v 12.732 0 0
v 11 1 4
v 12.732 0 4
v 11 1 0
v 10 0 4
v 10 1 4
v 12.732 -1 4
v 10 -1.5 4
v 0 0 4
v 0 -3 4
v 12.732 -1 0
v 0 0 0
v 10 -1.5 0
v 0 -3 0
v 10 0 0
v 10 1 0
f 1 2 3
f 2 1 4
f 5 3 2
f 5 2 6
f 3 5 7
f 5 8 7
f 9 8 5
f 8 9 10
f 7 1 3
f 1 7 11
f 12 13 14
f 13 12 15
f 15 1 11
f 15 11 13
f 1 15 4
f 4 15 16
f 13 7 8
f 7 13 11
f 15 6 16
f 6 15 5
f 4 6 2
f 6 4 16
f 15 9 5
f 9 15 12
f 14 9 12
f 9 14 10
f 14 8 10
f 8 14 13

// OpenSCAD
/*simple Snap library based on "Snap-Fit Joints for Plastics - A Design Guid" by Bayer MaterialScience LLC 
  http://fab.cba.mit.edu/classes/S62.12/people/vernelle.noel/Plastic_Snap_fit_design.pdf
 
 on http://www.thingiverse.com/thing:1860118
 
    by fpetrac Fausto Petraccone fpetrac@gmail.com 
    Licensed under the Creative Commons - Attribution - Non-Commercial license.
*/

/*Rev
    SnapLib 0.36.scad: added SnapHoleY function  
    SnapLib 0.35.scad: on RSnapY added a check to avioid interference of lobes during closure; on RRSnappY added a check to avioid overlapped lobes.
    SnapLib 0.30.scad  added function Hsnap and Snap to calculate the snap H or Y for cantilever snap
    SnapLib 0.25.scad  added Scale factor f to reduce the calculate value h or y (this mantain the snap on unbreakable zone when f>1)
    Snaprofile = 12; // [1:MXL, 2:40DP, 3:XL, 4:H, 5:T2.5, 6:T5, 7:T10, 8:AT5, 9:HTD_3mm, 10:HTD_5mm, 11:HTD_8mm, 12:GT2_2mm, 13:GT2_3mm, 14:GT2_5mm]
pLib 0.20.scad  Bug Fix
    SnapLib 0.10.scad  added RSnapY RRSnapY
    SnapLib 0.00.scad  first release
*///Example: 
//SnapY(la=10,root=5,uCut=1,l=30,w=4,help=true);

la=10;  //arm length(x)
root=3; //arm thickness at root
uCut=1;l=30;
w=4;    //arm width
f=1;    //factor
help=false; //help message

h=root;


/*
eps=0.5*6/100;//Elongation at break of PLA=6%
eps=0.5*12/100;//Elongation at break of ABS=12%
eps=0.5*18/100;//Elongation at break of PETG=18%
*/


profile = 1; // [1:SnapY, 2:SnapH, 3:SnapHoleY, 4:RSanapY, 5:RRSnapY]
if ( profile == 1 ) {SnapY(la=10,root=3,uCut=1,l=30,w=4,f=1,help=false ); }
if ( profile == 2 ) {SnapH(l,root,uCut,w,f=1,help); }
if ( profile == 3 ) {SnapHoleY(l=10,h=3,uCut=1,a=30,b=3,f=1,Pr=2); }
if ( profile == 4 ) {RSnapY(l,h,a,Lobi,r2,f=1,K2=2); }
if ( profile == 5 ) {RRSnapY(l,h,a,Lobi,r2,f=1,K1=2); }

eps=0.5*6/100;//Elongation at break of PLA=6%

//******************* functions **************************
function arm(l=10,w=4)=[[0,0],[l,0],[l,-w/2],[0,-w]];
function hook(width=4,uCut=1,xLand=1,angle=30,yLand=1)=[[0,0],[0,uCut],[xLand,uCut],[xLand+uCut/tan(angle),0],[xLand+uCut/tan(angle),-yLand],[0,-width]];
function Hsnap(l,y,f)= (1.09/f)*(eps*pow(la,2))/(y);
function Ysnap(l,h,f)= (1.09/f)*(eps*pow(la,2))/(h);

//SnapH(l=length,y,a=angle,b=width,f=1) Define y calculate h and divide the calculte h value to a factor f

//********************************************************
module SnapH(la,uCut,root,w,f=1)   
{
    h=Hsnap(l,y,f); //(length,depth,factor)
    p=y;
    
linear_extrude(height = b, center = f, convexity = 10, twist = 0)
polygon([[0,0],[l,0],[l,y],[l+p,y],[l+p+(y+h/4)/tan(a),-h/4],[l,-h/2],[0,-h]]);
}

//SnapY(la,root,uCut,l,w,f,help) 
//Define root calculate y and divide the calculated y value by a factor f

//********************************************************
module SnapY(la=10,root=3,uCut=1,l=30,w=4,f=1,help=false){
    helpText="Usage:\nmodule SnapY(la,root,uCut,l,w,f,help=false)\n
    la=length of clip from root of arm to hook(x)\n
    root=width of arm at root,\n
    uCut=depth of undercut(hook protrusion)\n
    l=overall length of clip(x)\n
    w=width of arm(z)\n
    f=factor)";
    if(help)echo(helpText);
    y=min(Ysnap(la,root,f),uCut);
     translate([la,0,0])linear_extrude(w)polygon(hook(root/2,uCut,1,l,1));
    linear_extrude(w)polygon(arm(la,root));
}

//********************************************************
//SnapHoleY(l,h,a,b,f=1,Pr=2) Define h calculate y and divide the calculte y value to a factor f the total hole depth is h*PR
module SnapHoleY(l=10,h=3,uCut=1,a=30,b=3,f=1,Pr=2){
        //%SnapY(l,h,a,b);  
        y=min(Ysnap(l,h,f),uCut); 
        YY=Pr*h;//depth Y;
        XX=1.1*(y+(y+h/4)/tan(a)); //Altezza totale +10%
        ZZ=0+b; //largezza piu tolleranza
        union(){
            translate([0,-YY,(b-ZZ)/2])cube([l,YY,ZZ],center=false); //gambo
            translate([l,-YY,(b-ZZ)/2])cube([XX,YY+y,ZZ],center=false);//testa
        }    
 }


//Define h calculate y and divide the calculated value to f
 
//********************************************************
module RSnapY(l,h,a,Lobi,r2,f=1,K2=2)   
{
    Theta=180/Lobi;
    y=(1.64/f)*K2*(eps*pow(l,2))/(r2);
    p=y;
    if(((r2-h)>y)&&(h<r2)){ //(r2-h)>y should be (r2-h/2)>y and  h<r2 for scad problem
      for(f=[0:1:Lobi])
          rotate([0,0,Theta*2*f])
              rotate_extrude(angle = Theta, convexity = 2,$fn=200)
                  translate([r2,0,0])
                      mirror([1,-1,0])
                          polygon([[0,0],[l,0],[l,y],[l+p,y],[l+p+(y+h/4)/tan(a),-h/4],[l,-h/2],[0,-h]]);
    }
    else{
      echo ("<b>WARNING:</b>");
      echo("y should be < r2-h ");
      echo("h should be < r2 ");
    }
}
//Define h calculate y and divide the calculated value to f

//********************************************************
module RRSnapY(l,h,a,Lobi,r2,f=1,K1=2)
{
    Theta=180/Lobi;
    y=(1.64/f)*K1*(eps*pow(l,2))/(r2);
    p=y;
    echo("y is", y);
    echo("r1/r2",(r2-h)/r2);
    echo("Theta", Theta);
    echo("r2-y",(r2-y));
    if(y<r2){
      for(f=[0:1:Lobi])
          rotate([0,180,Theta*2*f])
              rotate_extrude(angle = Theta, convexity = 2,$fn=200)
                  translate([r2,0,0])
                      mirror([1,1,0])
                          polygon([[0,0],[l,0],[l,y],[l+p,y],[l+p+(y+h/4)/tan(a),-h/4],[l,-h/2],[0,-h]]);
  }
      else{
      echo ("<b>WARNING:</b>");
      echo("y should be < r2 ");
      }
}
